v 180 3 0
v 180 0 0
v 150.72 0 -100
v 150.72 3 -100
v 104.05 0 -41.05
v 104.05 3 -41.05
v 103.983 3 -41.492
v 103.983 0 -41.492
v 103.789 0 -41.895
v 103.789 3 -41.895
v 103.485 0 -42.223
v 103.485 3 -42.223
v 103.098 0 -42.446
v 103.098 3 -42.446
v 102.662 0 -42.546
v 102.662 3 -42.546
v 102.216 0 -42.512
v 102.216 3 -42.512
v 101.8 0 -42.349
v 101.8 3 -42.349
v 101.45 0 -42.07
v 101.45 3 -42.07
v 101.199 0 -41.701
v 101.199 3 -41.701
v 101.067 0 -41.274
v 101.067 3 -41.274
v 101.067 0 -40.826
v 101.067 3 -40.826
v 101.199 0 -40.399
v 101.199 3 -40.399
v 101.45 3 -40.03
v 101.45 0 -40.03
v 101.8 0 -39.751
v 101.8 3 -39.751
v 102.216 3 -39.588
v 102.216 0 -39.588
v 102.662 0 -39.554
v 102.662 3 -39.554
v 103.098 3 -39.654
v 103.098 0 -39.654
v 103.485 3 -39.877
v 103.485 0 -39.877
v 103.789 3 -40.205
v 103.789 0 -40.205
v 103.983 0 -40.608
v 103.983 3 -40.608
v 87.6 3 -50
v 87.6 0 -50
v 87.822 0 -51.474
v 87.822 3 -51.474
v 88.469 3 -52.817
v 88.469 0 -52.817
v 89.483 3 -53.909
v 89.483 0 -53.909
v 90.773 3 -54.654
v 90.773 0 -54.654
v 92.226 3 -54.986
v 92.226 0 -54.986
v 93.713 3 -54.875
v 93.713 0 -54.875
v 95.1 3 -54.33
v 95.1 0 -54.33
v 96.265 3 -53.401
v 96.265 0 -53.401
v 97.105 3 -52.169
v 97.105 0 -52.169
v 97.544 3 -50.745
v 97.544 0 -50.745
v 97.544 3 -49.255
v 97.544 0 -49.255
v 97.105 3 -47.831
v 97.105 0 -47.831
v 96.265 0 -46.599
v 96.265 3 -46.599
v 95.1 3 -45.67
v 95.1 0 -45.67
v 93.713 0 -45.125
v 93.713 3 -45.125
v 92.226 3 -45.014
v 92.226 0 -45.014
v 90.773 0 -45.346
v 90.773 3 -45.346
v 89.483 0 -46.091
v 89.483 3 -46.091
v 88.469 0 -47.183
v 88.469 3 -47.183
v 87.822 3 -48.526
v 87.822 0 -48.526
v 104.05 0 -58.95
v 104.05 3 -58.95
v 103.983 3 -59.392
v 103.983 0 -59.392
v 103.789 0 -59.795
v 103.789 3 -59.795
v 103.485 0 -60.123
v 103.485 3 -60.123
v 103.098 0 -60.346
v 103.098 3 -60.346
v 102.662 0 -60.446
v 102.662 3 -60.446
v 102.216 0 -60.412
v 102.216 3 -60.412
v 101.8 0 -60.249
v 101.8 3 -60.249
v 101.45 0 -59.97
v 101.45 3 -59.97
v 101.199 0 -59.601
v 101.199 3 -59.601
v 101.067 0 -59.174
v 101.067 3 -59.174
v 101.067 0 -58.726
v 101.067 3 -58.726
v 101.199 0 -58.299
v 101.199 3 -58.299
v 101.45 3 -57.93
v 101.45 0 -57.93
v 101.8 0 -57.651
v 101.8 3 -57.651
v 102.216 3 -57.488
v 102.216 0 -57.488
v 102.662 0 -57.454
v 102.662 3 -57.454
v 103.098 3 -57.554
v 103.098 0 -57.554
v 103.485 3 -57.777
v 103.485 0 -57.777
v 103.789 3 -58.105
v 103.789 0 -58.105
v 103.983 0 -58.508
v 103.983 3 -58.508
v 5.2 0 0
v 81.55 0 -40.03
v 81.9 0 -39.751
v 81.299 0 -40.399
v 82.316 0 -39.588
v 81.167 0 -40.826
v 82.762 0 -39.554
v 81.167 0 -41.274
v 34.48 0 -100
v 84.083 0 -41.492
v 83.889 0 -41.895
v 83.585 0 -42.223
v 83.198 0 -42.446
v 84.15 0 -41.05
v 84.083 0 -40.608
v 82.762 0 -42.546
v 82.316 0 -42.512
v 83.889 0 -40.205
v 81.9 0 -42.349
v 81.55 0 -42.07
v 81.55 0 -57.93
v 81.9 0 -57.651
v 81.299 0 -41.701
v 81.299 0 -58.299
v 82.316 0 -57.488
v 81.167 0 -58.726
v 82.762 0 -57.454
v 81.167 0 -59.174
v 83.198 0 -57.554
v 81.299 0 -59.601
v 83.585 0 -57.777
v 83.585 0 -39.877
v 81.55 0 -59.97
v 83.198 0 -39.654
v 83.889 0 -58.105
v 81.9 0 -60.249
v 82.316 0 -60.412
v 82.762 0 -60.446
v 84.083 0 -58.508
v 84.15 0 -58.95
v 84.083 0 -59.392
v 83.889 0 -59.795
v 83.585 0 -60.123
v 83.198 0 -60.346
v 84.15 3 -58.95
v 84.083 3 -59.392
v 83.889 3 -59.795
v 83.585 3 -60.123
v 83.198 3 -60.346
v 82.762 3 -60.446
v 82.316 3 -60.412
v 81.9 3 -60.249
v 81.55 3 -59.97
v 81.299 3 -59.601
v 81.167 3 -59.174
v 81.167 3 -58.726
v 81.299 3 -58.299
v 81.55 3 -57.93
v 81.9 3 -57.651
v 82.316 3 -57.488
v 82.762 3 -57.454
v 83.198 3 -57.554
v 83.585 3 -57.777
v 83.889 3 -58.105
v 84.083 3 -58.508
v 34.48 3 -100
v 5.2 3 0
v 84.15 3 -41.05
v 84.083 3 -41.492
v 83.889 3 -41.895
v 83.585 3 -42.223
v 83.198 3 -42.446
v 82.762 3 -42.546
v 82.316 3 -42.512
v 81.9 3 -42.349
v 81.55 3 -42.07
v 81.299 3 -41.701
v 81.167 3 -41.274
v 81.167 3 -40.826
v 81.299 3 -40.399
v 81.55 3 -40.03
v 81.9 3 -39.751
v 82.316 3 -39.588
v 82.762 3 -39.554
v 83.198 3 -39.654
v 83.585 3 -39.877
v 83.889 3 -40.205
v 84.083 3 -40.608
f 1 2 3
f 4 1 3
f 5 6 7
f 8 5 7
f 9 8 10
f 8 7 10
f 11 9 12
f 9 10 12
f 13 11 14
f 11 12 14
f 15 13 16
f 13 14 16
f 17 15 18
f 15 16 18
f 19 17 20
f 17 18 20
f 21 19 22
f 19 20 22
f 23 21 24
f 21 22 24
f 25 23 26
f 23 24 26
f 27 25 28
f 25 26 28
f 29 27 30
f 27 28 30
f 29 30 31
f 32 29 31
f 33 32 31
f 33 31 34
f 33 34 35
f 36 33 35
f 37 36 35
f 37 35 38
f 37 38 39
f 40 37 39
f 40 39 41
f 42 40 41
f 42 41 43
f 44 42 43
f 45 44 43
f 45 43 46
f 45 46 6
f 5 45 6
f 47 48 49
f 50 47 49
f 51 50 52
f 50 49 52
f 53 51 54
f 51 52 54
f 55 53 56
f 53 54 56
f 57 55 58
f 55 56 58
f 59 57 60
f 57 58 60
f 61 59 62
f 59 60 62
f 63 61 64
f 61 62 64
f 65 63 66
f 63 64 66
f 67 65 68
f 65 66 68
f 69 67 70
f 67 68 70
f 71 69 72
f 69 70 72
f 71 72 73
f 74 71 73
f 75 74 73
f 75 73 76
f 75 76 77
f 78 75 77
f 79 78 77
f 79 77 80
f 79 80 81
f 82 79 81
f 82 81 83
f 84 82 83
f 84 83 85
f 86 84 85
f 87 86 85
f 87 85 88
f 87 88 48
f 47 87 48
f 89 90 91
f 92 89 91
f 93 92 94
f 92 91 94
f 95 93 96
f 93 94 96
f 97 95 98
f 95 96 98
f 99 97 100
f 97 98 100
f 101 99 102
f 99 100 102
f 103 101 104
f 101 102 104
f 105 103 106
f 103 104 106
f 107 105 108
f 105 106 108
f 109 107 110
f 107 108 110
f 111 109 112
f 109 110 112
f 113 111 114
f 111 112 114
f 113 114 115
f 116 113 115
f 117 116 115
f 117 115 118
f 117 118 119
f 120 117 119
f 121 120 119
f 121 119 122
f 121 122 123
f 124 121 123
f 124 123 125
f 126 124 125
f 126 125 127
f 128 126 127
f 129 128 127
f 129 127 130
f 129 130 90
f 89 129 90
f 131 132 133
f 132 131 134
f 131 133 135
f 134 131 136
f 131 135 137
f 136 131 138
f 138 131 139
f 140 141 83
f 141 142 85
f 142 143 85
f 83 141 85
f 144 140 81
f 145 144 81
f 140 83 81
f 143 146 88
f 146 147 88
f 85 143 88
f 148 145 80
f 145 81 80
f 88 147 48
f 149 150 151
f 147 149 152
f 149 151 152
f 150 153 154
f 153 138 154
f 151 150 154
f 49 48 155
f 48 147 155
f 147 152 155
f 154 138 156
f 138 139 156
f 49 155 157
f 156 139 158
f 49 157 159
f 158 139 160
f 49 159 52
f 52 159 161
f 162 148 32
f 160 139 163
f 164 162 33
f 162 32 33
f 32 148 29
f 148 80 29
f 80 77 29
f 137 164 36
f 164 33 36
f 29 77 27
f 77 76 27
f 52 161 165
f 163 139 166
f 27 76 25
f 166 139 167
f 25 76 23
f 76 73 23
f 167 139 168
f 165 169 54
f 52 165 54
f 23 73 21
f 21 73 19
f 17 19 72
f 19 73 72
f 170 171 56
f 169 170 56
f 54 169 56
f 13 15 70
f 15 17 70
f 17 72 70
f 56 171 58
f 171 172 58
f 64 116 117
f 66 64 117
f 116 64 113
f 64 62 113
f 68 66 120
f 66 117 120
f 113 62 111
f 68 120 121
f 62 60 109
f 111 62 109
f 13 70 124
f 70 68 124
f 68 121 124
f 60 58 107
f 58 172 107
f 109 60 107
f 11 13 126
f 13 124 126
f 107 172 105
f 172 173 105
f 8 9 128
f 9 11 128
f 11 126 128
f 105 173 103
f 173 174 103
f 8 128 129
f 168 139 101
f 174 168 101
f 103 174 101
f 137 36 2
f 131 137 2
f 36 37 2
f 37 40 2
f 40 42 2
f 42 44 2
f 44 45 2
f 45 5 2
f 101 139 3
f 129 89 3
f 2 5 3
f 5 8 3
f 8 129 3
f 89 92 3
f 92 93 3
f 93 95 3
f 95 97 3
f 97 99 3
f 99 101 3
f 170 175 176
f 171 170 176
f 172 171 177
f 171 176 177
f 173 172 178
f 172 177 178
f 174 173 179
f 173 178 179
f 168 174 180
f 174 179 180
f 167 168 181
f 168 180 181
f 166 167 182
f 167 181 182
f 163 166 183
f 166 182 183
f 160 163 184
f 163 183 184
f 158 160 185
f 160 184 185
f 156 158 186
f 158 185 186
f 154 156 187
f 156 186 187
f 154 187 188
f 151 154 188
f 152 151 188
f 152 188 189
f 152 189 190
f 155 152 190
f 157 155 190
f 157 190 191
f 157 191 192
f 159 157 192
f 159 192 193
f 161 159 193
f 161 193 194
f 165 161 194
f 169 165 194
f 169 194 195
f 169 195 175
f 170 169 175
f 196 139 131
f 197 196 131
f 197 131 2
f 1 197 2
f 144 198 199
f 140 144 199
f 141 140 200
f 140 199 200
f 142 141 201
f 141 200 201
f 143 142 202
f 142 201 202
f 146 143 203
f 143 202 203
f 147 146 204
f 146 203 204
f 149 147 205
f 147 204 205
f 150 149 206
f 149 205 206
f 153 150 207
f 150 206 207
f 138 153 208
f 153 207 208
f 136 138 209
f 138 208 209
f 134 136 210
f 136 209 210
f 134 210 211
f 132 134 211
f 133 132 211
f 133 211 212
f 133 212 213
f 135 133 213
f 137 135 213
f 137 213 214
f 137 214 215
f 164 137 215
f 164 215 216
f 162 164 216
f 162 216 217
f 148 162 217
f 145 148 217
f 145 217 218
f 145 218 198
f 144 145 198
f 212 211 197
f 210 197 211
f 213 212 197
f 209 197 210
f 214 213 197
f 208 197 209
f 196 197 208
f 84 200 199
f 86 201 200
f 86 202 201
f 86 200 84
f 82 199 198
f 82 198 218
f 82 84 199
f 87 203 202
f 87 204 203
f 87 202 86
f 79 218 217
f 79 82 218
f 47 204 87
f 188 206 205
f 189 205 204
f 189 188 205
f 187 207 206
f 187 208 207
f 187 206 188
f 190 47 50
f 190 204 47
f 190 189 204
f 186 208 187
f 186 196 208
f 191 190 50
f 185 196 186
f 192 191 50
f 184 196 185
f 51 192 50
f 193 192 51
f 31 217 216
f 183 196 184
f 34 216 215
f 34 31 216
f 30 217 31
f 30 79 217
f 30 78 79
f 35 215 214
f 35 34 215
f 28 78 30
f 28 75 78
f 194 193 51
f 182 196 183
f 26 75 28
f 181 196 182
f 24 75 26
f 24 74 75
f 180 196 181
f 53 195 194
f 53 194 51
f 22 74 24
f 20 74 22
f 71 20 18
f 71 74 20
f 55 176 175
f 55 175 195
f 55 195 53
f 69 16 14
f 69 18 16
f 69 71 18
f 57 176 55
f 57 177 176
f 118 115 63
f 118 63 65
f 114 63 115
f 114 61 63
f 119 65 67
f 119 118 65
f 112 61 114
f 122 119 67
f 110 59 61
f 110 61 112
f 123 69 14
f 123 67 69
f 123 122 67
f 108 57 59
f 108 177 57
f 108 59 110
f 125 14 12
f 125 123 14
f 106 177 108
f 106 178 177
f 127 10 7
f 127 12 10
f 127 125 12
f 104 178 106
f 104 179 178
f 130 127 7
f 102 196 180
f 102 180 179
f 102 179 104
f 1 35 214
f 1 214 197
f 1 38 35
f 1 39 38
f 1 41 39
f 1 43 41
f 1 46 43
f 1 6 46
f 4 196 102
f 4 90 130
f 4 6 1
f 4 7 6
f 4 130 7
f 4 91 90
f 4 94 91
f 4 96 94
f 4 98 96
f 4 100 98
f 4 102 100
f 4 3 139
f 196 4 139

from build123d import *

# Parameters (mm, degrees)
BOSS_EXTRUDE1_DEPTH        = 3
F_3_0MM_DOWEL_HOLE1_D      = 3
F_3_0MM_DOWEL_HOLE1_DEPTH  = 3
F_10_0MM_DOWEL_HOLE1_D     = 10
F_10_0MM_DOWEL_HOLE1_DEPTH = 3


with BuildPart() as part:
    # Sketch1 → Boss-Extrude1 (new body)
    with BuildSketch(Plane(origin=(0, 0, 0), x_dir=(1, 0, 0), z_dir=(0, 1, 0))):
        Polygon((5.2, 0), (180, 0), (150.720058283, 100), (34.479941717, 100), align=None)
    extrude(amount=BOSS_EXTRUDE1_DEPTH)

    # Ø3.0mm Dowel Hole1
    with Locations(Plane(origin=(0, 0, 0), x_dir=(-1, 0, 0), z_dir=(0, -1, 0))):
        with Locations((-82.65, 58.95), (-82.65, 41.05), (-102.55, 41.05), (-102.55, 58.95)):
            Hole(F_3_0MM_DOWEL_HOLE1_D / 2, depth=F_3_0MM_DOWEL_HOLE1_DEPTH)

    # Ø10.0mm Dowel Hole1
    with Locations(Plane(origin=(0, 3, 0), x_dir=(1, 0, 0), z_dir=(0, 1, 0))):
        with Locations((92.6, 50)):
            Hole(F_10_0MM_DOWEL_HOLE1_D / 2, depth=F_10_0MM_DOWEL_HOLE1_DEPTH)


solid = part.part
